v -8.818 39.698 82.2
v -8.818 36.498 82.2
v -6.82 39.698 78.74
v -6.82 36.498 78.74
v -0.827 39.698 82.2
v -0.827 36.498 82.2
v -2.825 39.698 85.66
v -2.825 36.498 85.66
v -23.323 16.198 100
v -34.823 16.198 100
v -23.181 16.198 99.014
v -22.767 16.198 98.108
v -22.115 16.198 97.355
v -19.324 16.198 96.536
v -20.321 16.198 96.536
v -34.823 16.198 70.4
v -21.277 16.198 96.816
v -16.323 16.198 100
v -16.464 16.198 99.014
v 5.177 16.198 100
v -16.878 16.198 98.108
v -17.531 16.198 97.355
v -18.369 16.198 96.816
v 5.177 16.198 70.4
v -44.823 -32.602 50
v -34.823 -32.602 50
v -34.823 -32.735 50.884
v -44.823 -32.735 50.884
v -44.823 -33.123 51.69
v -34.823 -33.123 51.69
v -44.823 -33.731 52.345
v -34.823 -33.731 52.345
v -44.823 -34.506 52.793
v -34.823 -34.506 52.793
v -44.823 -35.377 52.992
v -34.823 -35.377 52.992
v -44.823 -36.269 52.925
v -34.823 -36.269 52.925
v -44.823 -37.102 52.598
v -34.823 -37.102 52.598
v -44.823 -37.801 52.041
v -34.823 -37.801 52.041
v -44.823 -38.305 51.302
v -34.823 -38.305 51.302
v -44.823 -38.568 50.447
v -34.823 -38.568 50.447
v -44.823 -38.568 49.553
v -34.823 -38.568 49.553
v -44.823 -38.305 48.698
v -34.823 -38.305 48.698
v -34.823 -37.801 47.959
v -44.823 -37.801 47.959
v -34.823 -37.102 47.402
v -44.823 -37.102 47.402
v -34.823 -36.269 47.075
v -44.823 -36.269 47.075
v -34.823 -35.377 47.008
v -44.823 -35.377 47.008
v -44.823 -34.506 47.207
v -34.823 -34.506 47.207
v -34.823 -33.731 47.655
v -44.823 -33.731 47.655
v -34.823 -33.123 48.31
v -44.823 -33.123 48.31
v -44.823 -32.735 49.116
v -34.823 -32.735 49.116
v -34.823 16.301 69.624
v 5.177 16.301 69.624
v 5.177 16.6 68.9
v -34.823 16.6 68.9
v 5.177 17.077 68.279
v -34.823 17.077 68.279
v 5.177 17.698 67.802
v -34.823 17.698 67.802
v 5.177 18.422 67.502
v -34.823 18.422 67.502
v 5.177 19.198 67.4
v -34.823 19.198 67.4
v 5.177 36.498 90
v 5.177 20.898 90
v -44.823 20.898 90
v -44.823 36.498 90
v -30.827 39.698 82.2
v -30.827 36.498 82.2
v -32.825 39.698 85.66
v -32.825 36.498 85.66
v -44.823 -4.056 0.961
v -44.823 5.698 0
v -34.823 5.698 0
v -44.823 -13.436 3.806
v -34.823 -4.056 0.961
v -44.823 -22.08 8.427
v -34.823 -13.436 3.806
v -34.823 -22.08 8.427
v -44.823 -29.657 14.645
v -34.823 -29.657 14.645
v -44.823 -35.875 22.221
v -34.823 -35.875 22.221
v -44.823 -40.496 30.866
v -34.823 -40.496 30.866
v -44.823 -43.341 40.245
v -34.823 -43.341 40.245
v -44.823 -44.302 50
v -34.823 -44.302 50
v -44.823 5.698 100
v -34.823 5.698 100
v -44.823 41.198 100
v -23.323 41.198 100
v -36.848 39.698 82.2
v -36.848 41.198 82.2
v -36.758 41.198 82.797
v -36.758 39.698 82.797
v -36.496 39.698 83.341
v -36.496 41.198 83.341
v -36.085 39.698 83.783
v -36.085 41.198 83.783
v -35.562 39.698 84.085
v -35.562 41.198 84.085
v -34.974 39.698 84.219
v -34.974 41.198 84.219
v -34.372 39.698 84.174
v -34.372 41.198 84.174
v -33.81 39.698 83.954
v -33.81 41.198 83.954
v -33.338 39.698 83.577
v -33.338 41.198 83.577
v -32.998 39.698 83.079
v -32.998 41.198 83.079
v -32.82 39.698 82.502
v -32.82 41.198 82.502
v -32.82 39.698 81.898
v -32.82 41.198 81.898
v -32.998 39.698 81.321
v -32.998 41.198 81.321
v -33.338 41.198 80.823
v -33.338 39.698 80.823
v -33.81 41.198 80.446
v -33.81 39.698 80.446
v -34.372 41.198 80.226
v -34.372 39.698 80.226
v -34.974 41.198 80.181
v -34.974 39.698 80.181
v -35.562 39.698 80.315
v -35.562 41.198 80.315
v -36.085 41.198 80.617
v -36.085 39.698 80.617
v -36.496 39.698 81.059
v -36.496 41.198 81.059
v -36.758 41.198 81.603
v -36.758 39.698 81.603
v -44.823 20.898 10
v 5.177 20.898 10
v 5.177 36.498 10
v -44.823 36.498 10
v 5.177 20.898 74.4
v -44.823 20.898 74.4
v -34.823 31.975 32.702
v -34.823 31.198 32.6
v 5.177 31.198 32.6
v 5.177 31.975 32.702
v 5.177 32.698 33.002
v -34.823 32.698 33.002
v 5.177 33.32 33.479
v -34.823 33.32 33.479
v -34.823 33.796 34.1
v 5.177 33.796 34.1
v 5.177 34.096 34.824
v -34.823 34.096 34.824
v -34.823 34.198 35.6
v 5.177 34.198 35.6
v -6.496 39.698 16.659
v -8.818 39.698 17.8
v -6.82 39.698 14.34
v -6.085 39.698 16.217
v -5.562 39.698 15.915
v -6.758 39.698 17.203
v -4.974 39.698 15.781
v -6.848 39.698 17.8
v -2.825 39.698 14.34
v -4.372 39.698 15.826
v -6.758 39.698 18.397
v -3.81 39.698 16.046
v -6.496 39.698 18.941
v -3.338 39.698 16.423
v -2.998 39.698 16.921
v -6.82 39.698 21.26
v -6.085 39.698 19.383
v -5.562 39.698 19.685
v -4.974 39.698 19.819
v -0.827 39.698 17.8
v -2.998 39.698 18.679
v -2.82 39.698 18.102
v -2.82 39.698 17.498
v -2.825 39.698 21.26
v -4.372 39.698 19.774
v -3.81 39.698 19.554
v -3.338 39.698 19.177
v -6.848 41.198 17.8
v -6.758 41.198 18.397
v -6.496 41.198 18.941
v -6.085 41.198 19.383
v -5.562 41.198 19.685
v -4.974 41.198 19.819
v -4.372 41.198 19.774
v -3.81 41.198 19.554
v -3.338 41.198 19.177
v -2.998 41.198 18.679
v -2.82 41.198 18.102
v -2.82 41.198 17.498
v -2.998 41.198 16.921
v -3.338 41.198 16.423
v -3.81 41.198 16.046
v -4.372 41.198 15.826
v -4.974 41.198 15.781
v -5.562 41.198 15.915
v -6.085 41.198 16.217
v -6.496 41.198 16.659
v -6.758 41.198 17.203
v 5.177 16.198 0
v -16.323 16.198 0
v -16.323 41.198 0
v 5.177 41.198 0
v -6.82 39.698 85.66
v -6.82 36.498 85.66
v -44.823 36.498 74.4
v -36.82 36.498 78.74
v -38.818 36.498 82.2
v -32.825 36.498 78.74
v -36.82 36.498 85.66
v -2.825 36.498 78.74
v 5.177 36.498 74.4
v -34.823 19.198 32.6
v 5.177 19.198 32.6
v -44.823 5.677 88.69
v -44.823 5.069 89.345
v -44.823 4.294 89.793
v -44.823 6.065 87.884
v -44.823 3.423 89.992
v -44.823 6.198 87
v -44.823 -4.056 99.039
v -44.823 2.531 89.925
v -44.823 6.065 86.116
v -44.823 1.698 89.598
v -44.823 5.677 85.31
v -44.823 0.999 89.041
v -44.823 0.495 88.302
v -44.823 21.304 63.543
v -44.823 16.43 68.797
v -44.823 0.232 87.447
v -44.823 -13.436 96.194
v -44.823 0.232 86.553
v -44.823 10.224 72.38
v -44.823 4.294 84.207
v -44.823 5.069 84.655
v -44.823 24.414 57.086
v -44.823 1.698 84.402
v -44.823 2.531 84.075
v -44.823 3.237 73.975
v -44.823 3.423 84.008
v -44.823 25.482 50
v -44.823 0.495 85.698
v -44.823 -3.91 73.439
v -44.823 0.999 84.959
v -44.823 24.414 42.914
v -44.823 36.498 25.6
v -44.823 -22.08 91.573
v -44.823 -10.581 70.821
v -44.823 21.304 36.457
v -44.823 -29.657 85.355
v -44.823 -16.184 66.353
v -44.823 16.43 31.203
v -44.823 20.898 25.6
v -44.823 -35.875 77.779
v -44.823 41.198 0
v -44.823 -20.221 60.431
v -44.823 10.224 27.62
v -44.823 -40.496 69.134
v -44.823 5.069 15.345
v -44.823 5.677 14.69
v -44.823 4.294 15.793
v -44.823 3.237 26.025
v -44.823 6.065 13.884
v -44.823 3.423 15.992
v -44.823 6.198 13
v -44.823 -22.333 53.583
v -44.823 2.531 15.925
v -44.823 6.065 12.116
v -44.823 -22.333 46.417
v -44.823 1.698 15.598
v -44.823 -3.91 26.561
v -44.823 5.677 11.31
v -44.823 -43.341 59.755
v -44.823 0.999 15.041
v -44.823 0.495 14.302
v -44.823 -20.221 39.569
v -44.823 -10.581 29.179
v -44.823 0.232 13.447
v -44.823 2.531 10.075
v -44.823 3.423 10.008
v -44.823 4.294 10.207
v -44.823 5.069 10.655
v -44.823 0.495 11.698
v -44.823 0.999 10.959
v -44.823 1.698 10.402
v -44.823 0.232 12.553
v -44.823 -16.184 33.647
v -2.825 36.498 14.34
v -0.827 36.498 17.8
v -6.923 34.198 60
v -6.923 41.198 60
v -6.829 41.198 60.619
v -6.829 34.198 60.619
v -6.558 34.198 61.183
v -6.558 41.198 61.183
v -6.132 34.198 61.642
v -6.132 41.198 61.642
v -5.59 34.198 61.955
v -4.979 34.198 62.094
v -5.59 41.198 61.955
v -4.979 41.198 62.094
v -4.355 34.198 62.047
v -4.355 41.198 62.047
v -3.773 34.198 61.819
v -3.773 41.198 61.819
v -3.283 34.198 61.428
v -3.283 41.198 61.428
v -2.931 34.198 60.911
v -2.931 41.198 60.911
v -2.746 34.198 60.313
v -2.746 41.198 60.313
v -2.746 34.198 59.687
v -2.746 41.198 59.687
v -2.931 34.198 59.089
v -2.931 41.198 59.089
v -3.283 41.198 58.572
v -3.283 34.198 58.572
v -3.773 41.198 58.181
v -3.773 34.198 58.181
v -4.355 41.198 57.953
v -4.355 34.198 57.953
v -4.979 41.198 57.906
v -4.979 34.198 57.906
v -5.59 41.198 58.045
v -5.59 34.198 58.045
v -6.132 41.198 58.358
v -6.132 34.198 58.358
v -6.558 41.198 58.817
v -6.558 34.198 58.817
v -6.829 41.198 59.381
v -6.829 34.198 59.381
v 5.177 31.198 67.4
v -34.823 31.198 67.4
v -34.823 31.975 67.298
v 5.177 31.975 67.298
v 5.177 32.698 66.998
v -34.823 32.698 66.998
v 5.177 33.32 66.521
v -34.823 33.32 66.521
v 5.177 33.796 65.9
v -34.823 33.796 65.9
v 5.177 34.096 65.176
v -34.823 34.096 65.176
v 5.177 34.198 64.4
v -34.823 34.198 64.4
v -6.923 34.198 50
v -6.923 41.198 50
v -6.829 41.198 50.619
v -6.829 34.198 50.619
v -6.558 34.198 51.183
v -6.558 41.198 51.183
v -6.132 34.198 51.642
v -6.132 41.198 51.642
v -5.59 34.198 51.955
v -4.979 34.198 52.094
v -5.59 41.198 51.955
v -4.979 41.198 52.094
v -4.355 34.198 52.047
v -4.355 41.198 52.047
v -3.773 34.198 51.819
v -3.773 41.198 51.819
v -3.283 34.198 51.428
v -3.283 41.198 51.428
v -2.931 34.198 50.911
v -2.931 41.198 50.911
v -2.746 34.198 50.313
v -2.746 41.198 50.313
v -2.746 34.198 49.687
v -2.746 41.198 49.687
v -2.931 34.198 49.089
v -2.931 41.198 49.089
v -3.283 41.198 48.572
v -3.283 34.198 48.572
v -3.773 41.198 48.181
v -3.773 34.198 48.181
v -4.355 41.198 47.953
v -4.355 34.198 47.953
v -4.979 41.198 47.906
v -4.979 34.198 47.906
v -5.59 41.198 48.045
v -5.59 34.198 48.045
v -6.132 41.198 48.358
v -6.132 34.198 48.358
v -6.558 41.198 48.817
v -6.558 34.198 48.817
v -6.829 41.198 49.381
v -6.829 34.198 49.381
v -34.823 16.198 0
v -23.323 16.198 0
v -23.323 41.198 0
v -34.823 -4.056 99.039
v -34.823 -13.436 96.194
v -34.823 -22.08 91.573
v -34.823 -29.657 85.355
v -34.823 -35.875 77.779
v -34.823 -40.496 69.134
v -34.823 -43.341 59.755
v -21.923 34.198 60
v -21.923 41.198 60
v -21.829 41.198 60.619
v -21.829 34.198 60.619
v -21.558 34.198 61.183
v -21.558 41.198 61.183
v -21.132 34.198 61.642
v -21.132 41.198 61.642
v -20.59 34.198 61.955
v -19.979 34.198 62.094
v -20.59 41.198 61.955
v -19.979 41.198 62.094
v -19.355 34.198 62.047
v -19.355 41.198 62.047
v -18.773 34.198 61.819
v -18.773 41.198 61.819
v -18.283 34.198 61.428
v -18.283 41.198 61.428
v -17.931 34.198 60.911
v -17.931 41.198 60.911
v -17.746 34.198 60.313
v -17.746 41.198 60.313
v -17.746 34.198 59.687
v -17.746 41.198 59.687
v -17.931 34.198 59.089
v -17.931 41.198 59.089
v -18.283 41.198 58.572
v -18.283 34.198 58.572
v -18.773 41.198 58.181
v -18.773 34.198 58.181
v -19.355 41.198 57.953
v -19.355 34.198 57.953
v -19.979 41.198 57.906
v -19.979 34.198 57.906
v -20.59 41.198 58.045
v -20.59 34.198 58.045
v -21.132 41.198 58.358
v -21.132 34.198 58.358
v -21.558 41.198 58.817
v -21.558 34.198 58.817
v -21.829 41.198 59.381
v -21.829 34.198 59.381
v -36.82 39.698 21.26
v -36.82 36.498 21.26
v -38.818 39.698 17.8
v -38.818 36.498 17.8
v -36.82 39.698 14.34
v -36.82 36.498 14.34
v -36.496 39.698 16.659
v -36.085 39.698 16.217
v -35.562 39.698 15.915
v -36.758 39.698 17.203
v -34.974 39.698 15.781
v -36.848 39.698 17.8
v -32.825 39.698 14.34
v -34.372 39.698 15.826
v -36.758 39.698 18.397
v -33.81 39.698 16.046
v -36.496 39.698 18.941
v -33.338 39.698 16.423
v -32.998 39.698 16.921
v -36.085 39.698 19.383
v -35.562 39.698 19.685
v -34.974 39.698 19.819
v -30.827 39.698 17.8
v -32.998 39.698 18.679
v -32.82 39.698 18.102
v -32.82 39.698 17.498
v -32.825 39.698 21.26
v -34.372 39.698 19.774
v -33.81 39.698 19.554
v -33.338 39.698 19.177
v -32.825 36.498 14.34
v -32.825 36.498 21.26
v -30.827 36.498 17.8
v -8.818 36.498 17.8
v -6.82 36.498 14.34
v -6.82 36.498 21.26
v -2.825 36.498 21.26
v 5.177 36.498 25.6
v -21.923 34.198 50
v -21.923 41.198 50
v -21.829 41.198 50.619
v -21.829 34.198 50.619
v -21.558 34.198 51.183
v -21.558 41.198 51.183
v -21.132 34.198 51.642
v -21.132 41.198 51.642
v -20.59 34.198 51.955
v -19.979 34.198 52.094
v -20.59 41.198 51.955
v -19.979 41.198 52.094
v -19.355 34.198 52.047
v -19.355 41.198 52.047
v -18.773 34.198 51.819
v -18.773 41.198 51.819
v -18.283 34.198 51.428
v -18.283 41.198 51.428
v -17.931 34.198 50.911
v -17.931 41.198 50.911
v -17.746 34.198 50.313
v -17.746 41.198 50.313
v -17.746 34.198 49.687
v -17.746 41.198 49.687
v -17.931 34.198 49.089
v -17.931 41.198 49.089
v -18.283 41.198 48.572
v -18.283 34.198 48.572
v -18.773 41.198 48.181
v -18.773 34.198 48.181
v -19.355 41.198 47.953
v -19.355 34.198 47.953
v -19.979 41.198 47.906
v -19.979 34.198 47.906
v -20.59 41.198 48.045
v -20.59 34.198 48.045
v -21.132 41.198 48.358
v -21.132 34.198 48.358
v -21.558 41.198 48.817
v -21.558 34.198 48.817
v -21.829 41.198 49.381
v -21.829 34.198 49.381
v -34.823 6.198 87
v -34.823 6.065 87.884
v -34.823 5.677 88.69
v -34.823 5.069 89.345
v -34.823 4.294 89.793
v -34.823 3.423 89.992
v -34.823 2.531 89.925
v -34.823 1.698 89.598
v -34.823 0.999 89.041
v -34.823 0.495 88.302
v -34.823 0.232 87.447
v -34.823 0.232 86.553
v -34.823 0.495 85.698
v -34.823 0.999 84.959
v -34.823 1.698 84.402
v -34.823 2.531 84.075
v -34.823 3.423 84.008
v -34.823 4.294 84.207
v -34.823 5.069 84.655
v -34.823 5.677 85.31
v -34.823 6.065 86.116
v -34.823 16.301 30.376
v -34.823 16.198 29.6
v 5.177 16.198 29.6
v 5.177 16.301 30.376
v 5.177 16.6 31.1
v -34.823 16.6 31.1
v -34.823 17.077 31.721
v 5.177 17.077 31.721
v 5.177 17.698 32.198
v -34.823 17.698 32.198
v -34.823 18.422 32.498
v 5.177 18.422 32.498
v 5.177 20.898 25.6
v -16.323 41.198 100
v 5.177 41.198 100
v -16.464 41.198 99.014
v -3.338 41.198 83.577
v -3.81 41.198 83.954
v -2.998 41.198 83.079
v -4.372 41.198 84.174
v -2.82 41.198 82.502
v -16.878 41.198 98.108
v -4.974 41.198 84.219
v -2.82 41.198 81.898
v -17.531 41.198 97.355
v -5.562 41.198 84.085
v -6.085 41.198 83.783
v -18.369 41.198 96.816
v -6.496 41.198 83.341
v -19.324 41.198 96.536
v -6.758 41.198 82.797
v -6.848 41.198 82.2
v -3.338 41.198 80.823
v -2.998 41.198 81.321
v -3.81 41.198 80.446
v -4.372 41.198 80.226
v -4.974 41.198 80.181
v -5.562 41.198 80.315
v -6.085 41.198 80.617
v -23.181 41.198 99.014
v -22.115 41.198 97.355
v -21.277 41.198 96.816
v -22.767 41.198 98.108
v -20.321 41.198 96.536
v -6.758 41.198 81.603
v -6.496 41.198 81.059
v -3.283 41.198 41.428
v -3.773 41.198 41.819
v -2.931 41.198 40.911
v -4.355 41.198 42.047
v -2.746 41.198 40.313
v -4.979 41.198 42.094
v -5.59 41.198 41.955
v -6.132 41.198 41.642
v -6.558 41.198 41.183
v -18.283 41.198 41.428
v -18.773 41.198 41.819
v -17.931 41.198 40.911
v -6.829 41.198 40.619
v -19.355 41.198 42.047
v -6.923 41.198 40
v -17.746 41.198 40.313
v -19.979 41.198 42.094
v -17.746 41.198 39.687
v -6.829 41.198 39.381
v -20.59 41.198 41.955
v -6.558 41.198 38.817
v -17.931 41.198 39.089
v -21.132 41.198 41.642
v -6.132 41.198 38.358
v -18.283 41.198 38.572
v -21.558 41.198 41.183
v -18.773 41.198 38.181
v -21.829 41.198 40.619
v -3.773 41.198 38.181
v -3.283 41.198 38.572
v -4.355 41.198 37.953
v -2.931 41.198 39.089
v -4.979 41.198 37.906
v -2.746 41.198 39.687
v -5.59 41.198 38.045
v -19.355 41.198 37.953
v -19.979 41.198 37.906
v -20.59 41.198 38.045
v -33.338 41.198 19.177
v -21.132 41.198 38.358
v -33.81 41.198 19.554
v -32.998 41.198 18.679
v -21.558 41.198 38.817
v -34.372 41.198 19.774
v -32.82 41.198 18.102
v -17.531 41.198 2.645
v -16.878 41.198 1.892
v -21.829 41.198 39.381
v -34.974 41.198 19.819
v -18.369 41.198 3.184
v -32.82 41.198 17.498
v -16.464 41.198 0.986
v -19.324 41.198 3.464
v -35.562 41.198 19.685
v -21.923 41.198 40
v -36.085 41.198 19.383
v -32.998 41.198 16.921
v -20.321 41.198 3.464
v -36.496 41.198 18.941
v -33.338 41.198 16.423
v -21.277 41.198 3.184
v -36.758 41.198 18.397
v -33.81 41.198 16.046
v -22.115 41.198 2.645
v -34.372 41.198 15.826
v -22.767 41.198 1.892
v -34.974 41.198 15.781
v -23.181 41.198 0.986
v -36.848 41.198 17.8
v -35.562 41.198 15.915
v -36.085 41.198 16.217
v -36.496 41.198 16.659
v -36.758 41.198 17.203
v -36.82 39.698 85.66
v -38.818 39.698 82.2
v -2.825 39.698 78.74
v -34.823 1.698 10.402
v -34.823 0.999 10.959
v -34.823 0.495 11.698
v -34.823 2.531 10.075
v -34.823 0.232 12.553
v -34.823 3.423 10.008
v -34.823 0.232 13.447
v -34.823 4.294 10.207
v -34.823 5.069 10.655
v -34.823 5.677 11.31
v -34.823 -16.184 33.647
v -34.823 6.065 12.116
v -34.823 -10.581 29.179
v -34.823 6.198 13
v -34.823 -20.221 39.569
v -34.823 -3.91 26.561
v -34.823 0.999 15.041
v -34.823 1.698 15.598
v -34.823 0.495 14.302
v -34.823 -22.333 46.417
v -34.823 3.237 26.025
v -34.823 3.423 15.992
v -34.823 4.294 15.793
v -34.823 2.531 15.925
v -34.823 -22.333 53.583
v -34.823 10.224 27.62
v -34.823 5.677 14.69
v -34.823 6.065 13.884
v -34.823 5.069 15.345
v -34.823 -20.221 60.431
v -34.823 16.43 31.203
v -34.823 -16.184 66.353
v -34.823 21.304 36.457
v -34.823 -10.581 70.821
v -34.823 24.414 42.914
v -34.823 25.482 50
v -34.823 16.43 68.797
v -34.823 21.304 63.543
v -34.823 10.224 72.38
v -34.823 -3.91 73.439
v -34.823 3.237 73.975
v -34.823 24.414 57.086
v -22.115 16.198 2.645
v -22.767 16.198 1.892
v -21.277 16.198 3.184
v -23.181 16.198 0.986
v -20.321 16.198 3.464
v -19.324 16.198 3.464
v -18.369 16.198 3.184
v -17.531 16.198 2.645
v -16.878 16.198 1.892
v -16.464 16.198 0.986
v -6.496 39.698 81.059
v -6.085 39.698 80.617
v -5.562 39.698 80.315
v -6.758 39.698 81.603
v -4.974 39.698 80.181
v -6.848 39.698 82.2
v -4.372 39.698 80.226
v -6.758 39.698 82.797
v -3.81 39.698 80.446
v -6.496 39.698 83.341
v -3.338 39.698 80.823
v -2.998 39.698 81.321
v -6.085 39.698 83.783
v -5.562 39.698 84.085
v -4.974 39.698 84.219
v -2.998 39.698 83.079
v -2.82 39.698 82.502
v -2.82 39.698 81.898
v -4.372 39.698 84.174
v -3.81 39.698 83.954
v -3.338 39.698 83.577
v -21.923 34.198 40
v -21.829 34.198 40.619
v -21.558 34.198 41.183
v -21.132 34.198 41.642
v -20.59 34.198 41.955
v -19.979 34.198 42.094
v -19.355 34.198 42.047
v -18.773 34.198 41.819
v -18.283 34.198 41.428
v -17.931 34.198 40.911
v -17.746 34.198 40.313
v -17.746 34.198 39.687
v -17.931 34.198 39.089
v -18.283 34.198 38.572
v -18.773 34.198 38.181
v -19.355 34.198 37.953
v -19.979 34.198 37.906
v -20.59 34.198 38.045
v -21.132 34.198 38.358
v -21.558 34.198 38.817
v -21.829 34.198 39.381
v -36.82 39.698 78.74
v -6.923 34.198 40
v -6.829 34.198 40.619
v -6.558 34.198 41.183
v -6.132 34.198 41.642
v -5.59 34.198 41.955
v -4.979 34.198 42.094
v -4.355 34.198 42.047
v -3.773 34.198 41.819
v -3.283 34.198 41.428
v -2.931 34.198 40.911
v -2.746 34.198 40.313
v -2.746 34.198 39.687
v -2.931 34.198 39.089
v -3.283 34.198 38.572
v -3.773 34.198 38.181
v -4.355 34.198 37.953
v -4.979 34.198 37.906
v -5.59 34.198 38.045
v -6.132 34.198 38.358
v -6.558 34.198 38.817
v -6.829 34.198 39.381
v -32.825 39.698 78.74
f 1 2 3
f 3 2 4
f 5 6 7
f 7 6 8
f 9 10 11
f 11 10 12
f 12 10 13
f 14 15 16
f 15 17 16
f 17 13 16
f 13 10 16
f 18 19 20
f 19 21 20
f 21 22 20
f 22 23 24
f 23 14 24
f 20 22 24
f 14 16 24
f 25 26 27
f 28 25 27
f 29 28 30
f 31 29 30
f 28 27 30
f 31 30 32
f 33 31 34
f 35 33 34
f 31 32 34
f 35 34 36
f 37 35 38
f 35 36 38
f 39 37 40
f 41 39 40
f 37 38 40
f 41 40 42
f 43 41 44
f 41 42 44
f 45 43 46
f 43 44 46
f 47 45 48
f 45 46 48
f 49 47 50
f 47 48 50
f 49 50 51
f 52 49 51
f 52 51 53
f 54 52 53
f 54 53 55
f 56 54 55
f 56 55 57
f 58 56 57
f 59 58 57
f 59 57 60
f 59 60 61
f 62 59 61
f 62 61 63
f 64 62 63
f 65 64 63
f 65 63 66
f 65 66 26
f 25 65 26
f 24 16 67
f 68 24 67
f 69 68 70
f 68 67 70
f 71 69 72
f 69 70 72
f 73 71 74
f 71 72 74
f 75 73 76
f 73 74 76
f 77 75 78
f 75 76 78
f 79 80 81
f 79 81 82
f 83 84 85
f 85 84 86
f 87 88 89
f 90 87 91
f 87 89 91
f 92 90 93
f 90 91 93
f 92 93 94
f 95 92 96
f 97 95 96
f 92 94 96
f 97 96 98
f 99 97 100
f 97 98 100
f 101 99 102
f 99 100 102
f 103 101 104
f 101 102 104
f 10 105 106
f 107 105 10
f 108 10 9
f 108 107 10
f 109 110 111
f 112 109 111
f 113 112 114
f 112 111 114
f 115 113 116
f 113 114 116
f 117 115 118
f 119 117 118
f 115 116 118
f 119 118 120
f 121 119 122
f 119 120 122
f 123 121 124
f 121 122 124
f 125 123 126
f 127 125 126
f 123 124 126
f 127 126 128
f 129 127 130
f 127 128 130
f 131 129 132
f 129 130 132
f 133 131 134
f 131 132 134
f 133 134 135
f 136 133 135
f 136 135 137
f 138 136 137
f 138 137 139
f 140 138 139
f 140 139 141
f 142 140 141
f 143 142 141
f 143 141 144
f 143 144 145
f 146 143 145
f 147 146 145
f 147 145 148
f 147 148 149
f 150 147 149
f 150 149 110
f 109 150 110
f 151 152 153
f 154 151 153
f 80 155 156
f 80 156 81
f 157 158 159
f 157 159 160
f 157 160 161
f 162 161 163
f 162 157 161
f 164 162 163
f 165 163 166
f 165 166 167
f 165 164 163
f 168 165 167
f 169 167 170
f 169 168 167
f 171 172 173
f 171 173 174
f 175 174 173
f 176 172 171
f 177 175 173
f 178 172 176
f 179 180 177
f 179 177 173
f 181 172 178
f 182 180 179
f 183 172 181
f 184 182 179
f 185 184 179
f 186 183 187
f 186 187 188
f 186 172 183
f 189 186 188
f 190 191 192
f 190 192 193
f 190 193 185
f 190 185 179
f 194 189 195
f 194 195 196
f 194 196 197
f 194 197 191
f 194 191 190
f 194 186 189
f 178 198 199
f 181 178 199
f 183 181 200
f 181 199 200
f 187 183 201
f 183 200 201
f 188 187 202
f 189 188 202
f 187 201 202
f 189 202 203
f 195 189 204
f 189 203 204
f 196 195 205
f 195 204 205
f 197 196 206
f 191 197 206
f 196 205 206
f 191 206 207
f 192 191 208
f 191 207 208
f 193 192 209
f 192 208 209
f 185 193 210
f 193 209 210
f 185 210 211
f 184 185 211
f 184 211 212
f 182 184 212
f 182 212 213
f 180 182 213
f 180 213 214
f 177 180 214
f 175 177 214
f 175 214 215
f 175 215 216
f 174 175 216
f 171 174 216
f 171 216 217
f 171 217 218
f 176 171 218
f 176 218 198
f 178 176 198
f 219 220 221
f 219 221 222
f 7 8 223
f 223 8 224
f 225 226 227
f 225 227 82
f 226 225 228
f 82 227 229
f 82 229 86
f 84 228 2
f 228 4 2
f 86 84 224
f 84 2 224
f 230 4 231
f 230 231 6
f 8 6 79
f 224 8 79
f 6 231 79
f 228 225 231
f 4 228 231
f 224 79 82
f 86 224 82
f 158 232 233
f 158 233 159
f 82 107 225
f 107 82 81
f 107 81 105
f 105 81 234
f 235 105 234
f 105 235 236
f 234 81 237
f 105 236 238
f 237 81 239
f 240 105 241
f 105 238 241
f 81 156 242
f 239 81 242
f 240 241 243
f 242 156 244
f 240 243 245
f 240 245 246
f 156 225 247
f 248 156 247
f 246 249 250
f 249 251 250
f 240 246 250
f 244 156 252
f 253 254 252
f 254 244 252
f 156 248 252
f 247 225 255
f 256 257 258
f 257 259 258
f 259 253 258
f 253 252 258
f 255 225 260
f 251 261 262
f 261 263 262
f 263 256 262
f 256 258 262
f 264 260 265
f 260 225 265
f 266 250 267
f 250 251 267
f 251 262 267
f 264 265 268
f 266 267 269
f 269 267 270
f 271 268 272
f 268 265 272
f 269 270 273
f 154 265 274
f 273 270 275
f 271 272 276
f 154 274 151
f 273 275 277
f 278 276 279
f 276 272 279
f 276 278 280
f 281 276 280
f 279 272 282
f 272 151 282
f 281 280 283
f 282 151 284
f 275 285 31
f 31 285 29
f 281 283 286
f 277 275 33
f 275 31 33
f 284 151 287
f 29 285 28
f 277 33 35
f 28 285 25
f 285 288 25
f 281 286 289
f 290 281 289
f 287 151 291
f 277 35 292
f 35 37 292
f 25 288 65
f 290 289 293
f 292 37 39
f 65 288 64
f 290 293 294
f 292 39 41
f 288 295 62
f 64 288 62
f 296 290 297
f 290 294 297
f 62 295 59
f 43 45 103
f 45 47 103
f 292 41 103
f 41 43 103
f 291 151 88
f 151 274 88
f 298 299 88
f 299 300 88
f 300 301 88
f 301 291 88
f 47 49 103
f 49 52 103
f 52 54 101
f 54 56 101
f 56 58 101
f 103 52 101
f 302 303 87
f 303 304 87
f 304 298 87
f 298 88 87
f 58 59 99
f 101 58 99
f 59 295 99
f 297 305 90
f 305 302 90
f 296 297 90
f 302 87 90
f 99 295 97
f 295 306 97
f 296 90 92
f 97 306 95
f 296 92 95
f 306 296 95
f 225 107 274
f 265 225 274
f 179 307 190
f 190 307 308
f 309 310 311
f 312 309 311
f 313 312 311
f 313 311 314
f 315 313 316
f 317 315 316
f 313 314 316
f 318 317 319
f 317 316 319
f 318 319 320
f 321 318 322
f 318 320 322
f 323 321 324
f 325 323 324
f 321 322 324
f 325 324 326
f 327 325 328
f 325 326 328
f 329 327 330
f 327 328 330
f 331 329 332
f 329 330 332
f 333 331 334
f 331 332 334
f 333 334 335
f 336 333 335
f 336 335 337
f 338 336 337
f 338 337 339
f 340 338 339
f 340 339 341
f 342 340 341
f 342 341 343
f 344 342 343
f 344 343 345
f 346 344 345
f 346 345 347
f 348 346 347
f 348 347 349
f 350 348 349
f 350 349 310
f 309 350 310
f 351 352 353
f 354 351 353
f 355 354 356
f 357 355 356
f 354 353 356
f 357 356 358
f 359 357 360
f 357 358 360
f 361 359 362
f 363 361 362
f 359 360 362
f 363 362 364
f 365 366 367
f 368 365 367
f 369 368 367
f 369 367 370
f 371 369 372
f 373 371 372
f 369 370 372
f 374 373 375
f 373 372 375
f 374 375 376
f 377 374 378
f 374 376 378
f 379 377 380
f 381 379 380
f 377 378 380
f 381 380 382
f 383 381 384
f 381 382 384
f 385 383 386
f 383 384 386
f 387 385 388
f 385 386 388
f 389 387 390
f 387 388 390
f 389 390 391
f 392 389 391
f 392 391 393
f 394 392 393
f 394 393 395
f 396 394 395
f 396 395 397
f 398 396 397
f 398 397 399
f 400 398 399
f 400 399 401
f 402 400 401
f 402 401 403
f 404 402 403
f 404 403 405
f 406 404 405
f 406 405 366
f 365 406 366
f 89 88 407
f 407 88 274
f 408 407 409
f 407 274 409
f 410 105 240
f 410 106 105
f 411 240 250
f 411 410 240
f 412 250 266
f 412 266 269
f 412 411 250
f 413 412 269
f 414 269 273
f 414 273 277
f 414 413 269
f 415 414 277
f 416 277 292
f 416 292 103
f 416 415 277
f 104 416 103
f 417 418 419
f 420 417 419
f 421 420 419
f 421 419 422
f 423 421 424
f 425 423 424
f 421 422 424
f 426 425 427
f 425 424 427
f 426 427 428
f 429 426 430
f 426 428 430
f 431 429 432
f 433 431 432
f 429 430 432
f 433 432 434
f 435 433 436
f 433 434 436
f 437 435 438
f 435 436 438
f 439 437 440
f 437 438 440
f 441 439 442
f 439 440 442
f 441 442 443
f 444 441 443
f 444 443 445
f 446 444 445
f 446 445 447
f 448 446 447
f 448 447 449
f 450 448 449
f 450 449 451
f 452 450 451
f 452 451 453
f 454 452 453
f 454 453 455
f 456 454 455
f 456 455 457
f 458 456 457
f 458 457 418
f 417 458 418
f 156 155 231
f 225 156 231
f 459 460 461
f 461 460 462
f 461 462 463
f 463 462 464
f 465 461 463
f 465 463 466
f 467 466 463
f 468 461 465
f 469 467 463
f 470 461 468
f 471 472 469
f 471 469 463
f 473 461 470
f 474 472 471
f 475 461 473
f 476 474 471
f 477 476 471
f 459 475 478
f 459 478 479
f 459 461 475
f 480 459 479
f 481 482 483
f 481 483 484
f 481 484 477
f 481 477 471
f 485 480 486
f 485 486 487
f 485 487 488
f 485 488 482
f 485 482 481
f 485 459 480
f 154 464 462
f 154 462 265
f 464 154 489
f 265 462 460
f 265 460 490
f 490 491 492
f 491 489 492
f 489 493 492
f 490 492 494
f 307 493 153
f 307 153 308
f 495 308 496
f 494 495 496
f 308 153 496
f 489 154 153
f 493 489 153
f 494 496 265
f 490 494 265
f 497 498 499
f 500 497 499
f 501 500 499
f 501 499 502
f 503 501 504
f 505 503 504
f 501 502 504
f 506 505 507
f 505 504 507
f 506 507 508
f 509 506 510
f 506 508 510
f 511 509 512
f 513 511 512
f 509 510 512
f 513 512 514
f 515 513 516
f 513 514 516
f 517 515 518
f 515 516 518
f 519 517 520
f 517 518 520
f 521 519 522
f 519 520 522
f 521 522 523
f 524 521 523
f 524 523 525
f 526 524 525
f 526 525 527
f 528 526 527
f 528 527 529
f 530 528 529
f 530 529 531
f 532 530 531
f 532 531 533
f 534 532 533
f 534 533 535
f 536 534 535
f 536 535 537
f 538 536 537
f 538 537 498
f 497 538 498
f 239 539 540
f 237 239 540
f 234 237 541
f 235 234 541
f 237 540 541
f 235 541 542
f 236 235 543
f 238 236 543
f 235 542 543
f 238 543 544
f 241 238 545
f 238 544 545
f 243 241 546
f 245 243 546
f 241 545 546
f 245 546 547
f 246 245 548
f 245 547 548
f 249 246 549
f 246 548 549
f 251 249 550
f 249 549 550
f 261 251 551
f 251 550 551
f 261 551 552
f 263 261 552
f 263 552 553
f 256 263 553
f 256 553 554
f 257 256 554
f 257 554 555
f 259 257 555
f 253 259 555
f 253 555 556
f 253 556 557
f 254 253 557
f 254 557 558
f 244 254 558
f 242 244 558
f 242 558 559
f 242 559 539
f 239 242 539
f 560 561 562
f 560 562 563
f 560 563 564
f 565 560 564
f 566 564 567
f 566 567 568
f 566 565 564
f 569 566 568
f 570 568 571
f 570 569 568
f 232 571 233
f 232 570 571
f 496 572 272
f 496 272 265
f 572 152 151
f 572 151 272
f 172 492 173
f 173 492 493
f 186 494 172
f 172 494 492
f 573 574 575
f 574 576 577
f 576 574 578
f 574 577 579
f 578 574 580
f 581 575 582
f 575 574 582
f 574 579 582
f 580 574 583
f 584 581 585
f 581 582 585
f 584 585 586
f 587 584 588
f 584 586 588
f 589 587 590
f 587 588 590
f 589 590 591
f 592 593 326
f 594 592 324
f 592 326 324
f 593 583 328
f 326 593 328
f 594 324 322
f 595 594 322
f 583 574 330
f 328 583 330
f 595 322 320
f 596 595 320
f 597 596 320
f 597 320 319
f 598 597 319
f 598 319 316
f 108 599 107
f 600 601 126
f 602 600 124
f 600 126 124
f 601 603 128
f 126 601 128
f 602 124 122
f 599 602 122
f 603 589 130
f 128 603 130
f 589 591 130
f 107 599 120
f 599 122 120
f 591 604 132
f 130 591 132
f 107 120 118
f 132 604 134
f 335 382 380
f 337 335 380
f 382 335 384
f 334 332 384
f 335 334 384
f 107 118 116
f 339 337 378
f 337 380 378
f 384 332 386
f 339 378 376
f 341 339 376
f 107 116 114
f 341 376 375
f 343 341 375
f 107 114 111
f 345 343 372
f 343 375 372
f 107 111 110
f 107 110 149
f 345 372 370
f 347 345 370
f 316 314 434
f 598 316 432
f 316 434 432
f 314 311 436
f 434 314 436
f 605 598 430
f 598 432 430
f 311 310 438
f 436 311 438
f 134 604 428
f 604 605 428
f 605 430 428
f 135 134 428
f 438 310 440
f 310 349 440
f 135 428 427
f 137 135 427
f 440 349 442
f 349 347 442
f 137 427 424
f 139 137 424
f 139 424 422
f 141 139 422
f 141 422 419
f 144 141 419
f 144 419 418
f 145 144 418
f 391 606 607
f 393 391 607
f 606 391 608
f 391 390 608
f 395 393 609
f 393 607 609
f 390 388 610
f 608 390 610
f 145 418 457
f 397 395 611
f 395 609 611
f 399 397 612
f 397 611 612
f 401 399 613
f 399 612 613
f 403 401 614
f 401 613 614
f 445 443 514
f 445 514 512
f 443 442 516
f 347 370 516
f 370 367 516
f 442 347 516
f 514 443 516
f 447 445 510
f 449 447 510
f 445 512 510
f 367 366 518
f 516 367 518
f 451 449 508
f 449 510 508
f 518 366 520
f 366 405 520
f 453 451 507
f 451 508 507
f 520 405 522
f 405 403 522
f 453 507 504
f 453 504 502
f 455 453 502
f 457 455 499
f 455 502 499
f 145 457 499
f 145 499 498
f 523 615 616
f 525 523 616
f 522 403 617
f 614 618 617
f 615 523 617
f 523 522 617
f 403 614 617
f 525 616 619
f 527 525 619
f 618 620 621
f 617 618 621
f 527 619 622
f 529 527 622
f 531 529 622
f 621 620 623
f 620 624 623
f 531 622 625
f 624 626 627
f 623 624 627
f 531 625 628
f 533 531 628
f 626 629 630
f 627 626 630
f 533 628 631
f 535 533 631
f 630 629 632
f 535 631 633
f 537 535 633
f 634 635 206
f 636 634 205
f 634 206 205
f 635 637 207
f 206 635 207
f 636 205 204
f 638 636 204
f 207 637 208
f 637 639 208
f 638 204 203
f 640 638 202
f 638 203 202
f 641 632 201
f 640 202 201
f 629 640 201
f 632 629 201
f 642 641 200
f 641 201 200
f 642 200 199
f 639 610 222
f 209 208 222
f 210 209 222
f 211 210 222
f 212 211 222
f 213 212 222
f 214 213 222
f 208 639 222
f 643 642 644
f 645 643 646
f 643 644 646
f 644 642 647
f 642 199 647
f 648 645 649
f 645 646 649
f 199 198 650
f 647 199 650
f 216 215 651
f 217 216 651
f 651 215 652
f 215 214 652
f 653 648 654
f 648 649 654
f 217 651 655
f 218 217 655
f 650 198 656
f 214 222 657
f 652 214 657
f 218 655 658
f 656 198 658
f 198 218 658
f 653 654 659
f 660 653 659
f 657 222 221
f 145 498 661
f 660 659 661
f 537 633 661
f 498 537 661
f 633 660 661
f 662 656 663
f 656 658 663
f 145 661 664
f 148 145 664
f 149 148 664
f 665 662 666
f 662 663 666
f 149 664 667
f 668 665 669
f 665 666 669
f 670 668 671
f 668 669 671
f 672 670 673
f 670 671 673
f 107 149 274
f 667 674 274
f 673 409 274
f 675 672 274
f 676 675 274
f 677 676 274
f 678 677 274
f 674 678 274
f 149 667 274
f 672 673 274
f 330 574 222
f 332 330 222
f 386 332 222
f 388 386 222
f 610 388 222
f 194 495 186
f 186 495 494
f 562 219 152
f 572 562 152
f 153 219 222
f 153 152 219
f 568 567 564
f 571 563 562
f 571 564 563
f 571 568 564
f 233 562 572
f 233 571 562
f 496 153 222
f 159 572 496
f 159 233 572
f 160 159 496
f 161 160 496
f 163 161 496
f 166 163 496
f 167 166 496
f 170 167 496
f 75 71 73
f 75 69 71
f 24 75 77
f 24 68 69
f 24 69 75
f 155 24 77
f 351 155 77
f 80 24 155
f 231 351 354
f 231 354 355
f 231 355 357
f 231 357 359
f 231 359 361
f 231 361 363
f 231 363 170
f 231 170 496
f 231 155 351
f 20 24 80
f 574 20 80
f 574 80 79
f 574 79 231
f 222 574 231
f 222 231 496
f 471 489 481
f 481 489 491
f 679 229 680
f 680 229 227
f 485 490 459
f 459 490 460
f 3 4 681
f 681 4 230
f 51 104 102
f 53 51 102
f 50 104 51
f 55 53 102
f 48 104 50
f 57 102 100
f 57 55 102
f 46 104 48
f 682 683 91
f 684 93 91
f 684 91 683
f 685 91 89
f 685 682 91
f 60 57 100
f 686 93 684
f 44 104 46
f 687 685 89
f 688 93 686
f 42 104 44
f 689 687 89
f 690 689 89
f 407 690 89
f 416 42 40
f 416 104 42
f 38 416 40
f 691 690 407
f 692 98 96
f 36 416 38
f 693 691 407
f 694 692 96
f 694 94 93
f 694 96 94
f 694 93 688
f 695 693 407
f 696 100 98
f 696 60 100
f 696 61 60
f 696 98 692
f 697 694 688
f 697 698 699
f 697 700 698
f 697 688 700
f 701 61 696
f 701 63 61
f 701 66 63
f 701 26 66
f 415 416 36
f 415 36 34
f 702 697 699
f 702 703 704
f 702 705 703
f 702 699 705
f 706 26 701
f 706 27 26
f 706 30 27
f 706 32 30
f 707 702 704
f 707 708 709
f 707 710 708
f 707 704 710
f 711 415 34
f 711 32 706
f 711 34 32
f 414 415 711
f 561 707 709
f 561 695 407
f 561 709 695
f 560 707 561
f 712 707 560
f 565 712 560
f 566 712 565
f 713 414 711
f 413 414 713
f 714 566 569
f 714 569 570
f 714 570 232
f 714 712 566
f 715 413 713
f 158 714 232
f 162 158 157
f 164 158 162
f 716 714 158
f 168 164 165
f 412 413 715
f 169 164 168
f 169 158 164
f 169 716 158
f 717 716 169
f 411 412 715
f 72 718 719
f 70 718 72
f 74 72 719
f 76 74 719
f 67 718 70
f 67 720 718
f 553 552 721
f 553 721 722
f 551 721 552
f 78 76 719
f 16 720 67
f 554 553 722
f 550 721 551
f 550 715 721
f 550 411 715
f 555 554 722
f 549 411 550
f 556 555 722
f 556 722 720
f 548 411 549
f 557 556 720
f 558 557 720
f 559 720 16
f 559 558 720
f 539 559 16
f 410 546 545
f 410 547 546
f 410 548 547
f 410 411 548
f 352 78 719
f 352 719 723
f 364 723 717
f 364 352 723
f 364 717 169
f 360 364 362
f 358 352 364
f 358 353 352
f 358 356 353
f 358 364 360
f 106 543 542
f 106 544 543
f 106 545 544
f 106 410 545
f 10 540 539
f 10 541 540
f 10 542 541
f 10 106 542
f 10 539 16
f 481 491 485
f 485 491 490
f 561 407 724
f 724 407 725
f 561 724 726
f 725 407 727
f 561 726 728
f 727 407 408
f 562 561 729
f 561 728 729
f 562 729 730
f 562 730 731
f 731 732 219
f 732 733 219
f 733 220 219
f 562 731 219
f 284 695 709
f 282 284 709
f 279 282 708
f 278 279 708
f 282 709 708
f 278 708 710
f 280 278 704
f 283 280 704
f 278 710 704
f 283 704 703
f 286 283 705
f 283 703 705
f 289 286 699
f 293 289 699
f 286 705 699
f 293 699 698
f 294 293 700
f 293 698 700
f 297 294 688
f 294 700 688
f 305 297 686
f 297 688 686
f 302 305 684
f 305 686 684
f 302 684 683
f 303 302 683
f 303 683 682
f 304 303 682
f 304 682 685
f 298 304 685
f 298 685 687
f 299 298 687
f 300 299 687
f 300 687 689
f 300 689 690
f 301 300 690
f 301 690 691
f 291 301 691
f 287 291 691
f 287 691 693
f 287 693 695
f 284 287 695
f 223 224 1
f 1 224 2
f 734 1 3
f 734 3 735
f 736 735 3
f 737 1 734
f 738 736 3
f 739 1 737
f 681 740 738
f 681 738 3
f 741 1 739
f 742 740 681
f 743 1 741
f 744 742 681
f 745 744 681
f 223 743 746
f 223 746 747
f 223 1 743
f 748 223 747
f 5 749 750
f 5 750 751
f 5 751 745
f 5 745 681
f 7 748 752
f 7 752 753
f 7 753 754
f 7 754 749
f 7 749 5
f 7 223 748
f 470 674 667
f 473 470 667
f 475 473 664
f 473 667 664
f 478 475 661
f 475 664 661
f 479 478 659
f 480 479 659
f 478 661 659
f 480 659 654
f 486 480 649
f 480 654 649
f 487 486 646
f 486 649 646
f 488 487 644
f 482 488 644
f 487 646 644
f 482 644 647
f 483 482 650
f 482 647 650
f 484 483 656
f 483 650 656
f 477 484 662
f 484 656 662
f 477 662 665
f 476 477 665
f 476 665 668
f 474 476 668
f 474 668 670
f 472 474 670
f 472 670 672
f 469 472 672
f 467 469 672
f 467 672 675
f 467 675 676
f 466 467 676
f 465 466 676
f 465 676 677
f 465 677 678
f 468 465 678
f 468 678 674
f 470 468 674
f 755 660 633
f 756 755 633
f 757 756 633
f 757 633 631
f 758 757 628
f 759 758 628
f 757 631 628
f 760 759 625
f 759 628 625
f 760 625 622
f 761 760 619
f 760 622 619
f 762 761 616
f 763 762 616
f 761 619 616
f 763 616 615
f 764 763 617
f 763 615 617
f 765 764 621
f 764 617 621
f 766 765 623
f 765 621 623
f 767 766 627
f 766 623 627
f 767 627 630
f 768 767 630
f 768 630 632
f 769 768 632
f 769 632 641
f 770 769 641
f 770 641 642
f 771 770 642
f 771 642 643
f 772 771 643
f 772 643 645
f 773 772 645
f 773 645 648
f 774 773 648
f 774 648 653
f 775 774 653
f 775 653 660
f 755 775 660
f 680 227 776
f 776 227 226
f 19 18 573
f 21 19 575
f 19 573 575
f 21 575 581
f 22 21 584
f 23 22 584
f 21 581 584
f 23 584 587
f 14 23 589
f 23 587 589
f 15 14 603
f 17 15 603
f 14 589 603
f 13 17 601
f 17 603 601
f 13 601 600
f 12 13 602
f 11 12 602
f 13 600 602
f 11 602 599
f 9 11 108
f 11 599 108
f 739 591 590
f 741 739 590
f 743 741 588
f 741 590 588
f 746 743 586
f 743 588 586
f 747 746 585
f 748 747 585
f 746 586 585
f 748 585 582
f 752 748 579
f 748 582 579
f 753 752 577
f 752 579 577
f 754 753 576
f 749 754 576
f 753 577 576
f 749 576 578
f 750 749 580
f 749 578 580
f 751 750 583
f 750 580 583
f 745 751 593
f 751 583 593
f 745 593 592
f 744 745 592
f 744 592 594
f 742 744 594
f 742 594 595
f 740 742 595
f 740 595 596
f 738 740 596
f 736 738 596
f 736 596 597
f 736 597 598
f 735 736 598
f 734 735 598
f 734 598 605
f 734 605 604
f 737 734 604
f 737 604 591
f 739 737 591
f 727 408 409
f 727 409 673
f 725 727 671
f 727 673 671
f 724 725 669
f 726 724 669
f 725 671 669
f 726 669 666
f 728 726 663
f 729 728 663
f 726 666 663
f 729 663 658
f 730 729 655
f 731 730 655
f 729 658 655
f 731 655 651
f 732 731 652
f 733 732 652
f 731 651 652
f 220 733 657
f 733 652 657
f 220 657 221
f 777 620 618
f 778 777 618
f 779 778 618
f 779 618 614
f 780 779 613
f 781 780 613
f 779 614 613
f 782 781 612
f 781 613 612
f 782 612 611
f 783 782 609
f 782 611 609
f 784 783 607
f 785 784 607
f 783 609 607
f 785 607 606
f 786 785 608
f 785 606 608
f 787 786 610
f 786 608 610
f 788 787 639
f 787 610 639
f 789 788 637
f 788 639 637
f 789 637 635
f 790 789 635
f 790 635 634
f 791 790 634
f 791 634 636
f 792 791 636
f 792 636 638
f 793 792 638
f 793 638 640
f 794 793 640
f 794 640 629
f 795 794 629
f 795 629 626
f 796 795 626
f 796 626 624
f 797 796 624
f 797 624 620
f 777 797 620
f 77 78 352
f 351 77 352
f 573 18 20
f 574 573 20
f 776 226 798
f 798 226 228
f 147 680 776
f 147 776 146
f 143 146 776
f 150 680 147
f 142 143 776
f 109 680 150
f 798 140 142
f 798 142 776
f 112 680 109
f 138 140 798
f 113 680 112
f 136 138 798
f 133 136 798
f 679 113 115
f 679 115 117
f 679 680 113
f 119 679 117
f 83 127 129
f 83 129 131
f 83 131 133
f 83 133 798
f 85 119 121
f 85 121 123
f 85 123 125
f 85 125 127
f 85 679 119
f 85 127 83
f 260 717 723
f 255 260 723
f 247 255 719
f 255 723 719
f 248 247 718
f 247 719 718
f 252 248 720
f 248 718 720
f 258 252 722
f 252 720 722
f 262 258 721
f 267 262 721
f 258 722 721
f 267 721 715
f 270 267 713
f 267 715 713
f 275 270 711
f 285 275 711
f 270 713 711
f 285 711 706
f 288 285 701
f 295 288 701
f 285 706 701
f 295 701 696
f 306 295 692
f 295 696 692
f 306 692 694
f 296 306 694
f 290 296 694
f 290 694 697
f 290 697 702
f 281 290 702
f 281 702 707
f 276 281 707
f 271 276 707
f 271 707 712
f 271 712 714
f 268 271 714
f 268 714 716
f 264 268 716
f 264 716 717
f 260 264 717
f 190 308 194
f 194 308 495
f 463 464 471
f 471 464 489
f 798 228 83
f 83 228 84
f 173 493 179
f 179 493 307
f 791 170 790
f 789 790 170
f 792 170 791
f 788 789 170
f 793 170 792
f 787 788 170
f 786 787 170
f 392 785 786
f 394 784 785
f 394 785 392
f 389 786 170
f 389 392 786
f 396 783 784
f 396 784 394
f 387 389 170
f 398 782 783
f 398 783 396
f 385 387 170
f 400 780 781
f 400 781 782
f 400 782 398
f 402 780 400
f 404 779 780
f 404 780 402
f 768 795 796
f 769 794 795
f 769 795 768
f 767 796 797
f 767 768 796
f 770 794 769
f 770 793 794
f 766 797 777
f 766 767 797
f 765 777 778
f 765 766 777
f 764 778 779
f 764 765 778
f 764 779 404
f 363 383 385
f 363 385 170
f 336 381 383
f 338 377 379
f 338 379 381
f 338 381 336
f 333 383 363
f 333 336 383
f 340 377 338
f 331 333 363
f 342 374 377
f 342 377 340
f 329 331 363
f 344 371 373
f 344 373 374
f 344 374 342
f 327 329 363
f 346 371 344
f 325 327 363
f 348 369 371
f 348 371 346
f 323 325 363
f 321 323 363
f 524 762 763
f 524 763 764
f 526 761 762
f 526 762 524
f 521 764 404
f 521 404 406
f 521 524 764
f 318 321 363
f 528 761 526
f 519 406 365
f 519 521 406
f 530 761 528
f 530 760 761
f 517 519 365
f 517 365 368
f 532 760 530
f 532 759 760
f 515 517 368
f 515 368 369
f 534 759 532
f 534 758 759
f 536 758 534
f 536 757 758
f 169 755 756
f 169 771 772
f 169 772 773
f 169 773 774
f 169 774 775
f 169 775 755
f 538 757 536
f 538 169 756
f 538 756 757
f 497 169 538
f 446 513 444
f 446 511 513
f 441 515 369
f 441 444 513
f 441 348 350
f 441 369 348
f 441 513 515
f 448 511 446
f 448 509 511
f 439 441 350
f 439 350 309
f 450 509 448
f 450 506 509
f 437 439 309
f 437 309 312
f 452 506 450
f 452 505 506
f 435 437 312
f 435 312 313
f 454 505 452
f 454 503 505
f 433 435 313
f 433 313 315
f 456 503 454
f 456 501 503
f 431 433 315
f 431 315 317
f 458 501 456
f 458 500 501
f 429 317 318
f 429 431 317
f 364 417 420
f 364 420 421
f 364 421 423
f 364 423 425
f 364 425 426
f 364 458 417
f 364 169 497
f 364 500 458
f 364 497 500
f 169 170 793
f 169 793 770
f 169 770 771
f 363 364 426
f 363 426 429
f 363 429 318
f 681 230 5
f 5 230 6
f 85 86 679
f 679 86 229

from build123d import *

# Parameters (mm, degrees)
F1_DEPTH     = 100
F2_W         = 15.6
F2_H         = 15.6
F3_DEPTH     = 134.9
F5_DEPTH     = 3.2
F6_R         = 2.025
F7_DEPTH     = 10
F8_R         = 3
F8_R_2       = 24.0417525773
F9_DEPTH     = 15
F10_R        = 49.99999
F11_W        = 18
F11_H        = 34.8
F12_DEPTH    = 100
F13_R        = 3.5
F14_DEPTH    = 50
F15_R        = 2.1
F16_DEPTH    = 25
F17_T1_DEPTH = 47.5
F17_T3_DEPTH = 47.5


# Not quite as in the source:
# - a fillet or chamfer that OpenCascade refuses, or shapes differently, is made with other operations: its cross-section is extruded or revolved along the edge and cut away or added
# - a fillet or chamfer is up to 0.001 mm smaller than in the source, because OpenCascade refuses the exact size


with BuildPart() as f1:
    # F0 (on Top) → F1 (new body)
    with BuildSketch(Plane.XY):
        Polygon((5.1774463622, 16.1983228068), (5.1774463622, 41.1983228068), (-44.8225536378, 41.1983228068), (-44.8225536378, -44.3016771932), (-34.8225536378, -44.3016771932), (-34.8225536378, 16.1983228068), align=None)
    extrude(amount=F1_DEPTH)

    # F2 (on face) → F3 (cut)
    with BuildSketch(Plane.YZ.offset(5.1774463622)):
        with Locations((28.6983228068, 17.8)):
            Rectangle(F2_W, F2_H)
        with Locations((28.6983228068, 82.2)):
            Rectangle(F2_W, F2_H)
    extrude(amount=-F3_DEPTH, mode=Mode.SUBTRACT)

    # F4 (on face) → F5 (cut)
    with BuildSketch(Plane.XZ.offset(-36.4983228068)):
        Polygon((-2.8249217064, 85.66), (-6.8201855692, 85.66), (-8.8178175006, 82.2), (-6.8201855692, 78.74), (-2.8249217064, 78.74), (-0.827289775, 82.2), align=None)
        Polygon((-32.8249217064, 85.66), (-36.8201855692, 85.66), (-38.8178175006, 82.2), (-36.8201855692, 78.74), (-32.8249217064, 78.74), (-30.827289775, 82.2), align=None)
        Polygon((-32.8249217064, 21.26), (-36.8201855692, 21.26), (-38.8178175006, 17.8), (-36.8201855692, 14.34), (-32.8249217064, 14.34), (-30.827289775, 17.8), align=None)
        Polygon((-2.8249217064, 21.26), (-6.8201855692, 21.26), (-8.8178175006, 17.8), (-6.8201855692, 14.34), (-2.8249217064, 14.34), (-0.827289775, 17.8), align=None)
    extrude(amount=-F5_DEPTH, mode=Mode.SUBTRACT)

    # F6 (on face) → F7 (cut)
    with BuildSketch(Plane(origin=(0, 41.1983228068, 0), x_dir=(-1, 0, 0), z_dir=(0, 1, 0))):
        with Locations((34.8225536378, 82.2)):
            Circle(F6_R)
        with Locations((4.8225536378, 17.8)):
            Circle(F6_R)
        with Locations((34.8225536378, 17.8)):
            Circle(F6_R)
        with Locations((4.8225536378, 82.2)):
            Circle(F6_R)
    extrude(amount=-F7_DEPTH, mode=Mode.SUBTRACT)

    # F8 (on face) → F9 (cut)
    with BuildSketch(Plane.YZ.offset(-34.8225536378)):
        with Locations((3.1983228068, 87)):
            Circle(F8_R)
        with Locations((3.1983228068, 13)):
            Circle(F8_R)
        with Locations((-35.6016771932, 50)):
            Circle(F8_R)
        with Locations((1.4400753841, 50)):
            Circle(F8_R_2)
    extrude(amount=-F9_DEPTH, mode=Mode.SUBTRACT)

    # F10 (radius 50 in the source; OpenCascade refuses exactly that, so slightly less here)
    f10_edges = [f1.edges().sort_by_distance(p)[0] for p in [
        (-39.822554, -44.301677, 100),
        (-39.822554, -44.301677, 0),
    ]]
    fillet(f10_edges, radius=F10_R)

    # F11 (on face) → F12 (cut)
    with BuildSketch(Plane.YZ.offset(-34.8225536378)):
        with Locations((25.1983228068, 50)):
            Rectangle(F11_W, F11_H)
    extrude(amount=F12_DEPTH, mode=Mode.SUBTRACT)

    # F13 (on face) → F14 (cut)
    with BuildSketch(Plane(origin=(0, 41.1983228068, 0), x_dir=(-1, 0, 0), z_dir=(0, 1, 0))):
        with Locations((19.8225536378, 0)):
            Circle(F13_R)
        with Locations((19.8225536378, 100)):
            Circle(F13_R)
    extrude(amount=-F14_DEPTH, mode=Mode.SUBTRACT)

    # F15 (on face) → F16 (cut)
    with BuildSketch(Plane(origin=(0, 41.1983228068, 0), x_dir=(-1, 0, 0), z_dir=(0, 1, 0))):
        with Locations((19.8225536378, 50)):
            Circle(F15_R)
        with Locations((19.8225536378, 60)):
            Circle(F15_R)
        with Locations((19.8225536378, 40)):
            Circle(F15_R)
        with Locations((4.8225536378, 50)):
            Circle(F15_R)
        with Locations((4.8225536378, 60)):
            Circle(F15_R)
        with Locations((4.8225536378, 40)):
            Circle(F15_R)
    extrude(amount=-F16_DEPTH, mode=Mode.SUBTRACT)

    # F17: fillet of radius 3 on 4 edges, made by hand

    # F17_s2 → F17_t1 (join)
    with BuildSketch(Plane.YZ.offset(-42.3225536378)):
        with BuildLine():
            ThreePointArc((31.1983228068, 67.4), (33.3196431503, 66.5213203436), (34.1983228068, 64.4))
            Line((34.1983228068, 64.4), (34.1983228068, 67.4))
            Line((34.1983228068, 67.4), (31.1983228068, 67.4))
        make_face()
        with BuildLine():
            ThreePointArc((31.1983228068, 32.6), (33.3196431503, 33.4786796564), (34.1983228068, 35.6))
            Line((34.1983228068, 35.6), (34.1983228068, 32.6))
            Line((34.1983228068, 32.6), (31.1983228068, 32.6))
        make_face()
    extrude(amount=F17_T1_DEPTH)

    # F17_s4 → F17_t3 (cut)
    with BuildSketch(Plane.YZ.offset(-34.8225536378)):
        with BuildLine():
            ThreePointArc((16.1983228068, 70.4), (17.0770024632, 68.2786796564), (19.1983228068, 67.4))
            Line((19.1983228068, 67.4), (16.1983228068, 67.4))
            Line((16.1983228068, 67.4), (16.1983228068, 70.4))
        make_face()
        with BuildLine():
            ThreePointArc((16.1983228068, 29.6), (17.0770024632, 31.7213203436), (19.1983228068, 32.6))
            Line((19.1983228068, 32.6), (16.1983228068, 32.6))
            Line((16.1983228068, 32.6), (16.1983228068, 29.6))
        make_face()
    extrude(amount=F17_T3_DEPTH, mode=Mode.SUBTRACT)


solid = f1.part
